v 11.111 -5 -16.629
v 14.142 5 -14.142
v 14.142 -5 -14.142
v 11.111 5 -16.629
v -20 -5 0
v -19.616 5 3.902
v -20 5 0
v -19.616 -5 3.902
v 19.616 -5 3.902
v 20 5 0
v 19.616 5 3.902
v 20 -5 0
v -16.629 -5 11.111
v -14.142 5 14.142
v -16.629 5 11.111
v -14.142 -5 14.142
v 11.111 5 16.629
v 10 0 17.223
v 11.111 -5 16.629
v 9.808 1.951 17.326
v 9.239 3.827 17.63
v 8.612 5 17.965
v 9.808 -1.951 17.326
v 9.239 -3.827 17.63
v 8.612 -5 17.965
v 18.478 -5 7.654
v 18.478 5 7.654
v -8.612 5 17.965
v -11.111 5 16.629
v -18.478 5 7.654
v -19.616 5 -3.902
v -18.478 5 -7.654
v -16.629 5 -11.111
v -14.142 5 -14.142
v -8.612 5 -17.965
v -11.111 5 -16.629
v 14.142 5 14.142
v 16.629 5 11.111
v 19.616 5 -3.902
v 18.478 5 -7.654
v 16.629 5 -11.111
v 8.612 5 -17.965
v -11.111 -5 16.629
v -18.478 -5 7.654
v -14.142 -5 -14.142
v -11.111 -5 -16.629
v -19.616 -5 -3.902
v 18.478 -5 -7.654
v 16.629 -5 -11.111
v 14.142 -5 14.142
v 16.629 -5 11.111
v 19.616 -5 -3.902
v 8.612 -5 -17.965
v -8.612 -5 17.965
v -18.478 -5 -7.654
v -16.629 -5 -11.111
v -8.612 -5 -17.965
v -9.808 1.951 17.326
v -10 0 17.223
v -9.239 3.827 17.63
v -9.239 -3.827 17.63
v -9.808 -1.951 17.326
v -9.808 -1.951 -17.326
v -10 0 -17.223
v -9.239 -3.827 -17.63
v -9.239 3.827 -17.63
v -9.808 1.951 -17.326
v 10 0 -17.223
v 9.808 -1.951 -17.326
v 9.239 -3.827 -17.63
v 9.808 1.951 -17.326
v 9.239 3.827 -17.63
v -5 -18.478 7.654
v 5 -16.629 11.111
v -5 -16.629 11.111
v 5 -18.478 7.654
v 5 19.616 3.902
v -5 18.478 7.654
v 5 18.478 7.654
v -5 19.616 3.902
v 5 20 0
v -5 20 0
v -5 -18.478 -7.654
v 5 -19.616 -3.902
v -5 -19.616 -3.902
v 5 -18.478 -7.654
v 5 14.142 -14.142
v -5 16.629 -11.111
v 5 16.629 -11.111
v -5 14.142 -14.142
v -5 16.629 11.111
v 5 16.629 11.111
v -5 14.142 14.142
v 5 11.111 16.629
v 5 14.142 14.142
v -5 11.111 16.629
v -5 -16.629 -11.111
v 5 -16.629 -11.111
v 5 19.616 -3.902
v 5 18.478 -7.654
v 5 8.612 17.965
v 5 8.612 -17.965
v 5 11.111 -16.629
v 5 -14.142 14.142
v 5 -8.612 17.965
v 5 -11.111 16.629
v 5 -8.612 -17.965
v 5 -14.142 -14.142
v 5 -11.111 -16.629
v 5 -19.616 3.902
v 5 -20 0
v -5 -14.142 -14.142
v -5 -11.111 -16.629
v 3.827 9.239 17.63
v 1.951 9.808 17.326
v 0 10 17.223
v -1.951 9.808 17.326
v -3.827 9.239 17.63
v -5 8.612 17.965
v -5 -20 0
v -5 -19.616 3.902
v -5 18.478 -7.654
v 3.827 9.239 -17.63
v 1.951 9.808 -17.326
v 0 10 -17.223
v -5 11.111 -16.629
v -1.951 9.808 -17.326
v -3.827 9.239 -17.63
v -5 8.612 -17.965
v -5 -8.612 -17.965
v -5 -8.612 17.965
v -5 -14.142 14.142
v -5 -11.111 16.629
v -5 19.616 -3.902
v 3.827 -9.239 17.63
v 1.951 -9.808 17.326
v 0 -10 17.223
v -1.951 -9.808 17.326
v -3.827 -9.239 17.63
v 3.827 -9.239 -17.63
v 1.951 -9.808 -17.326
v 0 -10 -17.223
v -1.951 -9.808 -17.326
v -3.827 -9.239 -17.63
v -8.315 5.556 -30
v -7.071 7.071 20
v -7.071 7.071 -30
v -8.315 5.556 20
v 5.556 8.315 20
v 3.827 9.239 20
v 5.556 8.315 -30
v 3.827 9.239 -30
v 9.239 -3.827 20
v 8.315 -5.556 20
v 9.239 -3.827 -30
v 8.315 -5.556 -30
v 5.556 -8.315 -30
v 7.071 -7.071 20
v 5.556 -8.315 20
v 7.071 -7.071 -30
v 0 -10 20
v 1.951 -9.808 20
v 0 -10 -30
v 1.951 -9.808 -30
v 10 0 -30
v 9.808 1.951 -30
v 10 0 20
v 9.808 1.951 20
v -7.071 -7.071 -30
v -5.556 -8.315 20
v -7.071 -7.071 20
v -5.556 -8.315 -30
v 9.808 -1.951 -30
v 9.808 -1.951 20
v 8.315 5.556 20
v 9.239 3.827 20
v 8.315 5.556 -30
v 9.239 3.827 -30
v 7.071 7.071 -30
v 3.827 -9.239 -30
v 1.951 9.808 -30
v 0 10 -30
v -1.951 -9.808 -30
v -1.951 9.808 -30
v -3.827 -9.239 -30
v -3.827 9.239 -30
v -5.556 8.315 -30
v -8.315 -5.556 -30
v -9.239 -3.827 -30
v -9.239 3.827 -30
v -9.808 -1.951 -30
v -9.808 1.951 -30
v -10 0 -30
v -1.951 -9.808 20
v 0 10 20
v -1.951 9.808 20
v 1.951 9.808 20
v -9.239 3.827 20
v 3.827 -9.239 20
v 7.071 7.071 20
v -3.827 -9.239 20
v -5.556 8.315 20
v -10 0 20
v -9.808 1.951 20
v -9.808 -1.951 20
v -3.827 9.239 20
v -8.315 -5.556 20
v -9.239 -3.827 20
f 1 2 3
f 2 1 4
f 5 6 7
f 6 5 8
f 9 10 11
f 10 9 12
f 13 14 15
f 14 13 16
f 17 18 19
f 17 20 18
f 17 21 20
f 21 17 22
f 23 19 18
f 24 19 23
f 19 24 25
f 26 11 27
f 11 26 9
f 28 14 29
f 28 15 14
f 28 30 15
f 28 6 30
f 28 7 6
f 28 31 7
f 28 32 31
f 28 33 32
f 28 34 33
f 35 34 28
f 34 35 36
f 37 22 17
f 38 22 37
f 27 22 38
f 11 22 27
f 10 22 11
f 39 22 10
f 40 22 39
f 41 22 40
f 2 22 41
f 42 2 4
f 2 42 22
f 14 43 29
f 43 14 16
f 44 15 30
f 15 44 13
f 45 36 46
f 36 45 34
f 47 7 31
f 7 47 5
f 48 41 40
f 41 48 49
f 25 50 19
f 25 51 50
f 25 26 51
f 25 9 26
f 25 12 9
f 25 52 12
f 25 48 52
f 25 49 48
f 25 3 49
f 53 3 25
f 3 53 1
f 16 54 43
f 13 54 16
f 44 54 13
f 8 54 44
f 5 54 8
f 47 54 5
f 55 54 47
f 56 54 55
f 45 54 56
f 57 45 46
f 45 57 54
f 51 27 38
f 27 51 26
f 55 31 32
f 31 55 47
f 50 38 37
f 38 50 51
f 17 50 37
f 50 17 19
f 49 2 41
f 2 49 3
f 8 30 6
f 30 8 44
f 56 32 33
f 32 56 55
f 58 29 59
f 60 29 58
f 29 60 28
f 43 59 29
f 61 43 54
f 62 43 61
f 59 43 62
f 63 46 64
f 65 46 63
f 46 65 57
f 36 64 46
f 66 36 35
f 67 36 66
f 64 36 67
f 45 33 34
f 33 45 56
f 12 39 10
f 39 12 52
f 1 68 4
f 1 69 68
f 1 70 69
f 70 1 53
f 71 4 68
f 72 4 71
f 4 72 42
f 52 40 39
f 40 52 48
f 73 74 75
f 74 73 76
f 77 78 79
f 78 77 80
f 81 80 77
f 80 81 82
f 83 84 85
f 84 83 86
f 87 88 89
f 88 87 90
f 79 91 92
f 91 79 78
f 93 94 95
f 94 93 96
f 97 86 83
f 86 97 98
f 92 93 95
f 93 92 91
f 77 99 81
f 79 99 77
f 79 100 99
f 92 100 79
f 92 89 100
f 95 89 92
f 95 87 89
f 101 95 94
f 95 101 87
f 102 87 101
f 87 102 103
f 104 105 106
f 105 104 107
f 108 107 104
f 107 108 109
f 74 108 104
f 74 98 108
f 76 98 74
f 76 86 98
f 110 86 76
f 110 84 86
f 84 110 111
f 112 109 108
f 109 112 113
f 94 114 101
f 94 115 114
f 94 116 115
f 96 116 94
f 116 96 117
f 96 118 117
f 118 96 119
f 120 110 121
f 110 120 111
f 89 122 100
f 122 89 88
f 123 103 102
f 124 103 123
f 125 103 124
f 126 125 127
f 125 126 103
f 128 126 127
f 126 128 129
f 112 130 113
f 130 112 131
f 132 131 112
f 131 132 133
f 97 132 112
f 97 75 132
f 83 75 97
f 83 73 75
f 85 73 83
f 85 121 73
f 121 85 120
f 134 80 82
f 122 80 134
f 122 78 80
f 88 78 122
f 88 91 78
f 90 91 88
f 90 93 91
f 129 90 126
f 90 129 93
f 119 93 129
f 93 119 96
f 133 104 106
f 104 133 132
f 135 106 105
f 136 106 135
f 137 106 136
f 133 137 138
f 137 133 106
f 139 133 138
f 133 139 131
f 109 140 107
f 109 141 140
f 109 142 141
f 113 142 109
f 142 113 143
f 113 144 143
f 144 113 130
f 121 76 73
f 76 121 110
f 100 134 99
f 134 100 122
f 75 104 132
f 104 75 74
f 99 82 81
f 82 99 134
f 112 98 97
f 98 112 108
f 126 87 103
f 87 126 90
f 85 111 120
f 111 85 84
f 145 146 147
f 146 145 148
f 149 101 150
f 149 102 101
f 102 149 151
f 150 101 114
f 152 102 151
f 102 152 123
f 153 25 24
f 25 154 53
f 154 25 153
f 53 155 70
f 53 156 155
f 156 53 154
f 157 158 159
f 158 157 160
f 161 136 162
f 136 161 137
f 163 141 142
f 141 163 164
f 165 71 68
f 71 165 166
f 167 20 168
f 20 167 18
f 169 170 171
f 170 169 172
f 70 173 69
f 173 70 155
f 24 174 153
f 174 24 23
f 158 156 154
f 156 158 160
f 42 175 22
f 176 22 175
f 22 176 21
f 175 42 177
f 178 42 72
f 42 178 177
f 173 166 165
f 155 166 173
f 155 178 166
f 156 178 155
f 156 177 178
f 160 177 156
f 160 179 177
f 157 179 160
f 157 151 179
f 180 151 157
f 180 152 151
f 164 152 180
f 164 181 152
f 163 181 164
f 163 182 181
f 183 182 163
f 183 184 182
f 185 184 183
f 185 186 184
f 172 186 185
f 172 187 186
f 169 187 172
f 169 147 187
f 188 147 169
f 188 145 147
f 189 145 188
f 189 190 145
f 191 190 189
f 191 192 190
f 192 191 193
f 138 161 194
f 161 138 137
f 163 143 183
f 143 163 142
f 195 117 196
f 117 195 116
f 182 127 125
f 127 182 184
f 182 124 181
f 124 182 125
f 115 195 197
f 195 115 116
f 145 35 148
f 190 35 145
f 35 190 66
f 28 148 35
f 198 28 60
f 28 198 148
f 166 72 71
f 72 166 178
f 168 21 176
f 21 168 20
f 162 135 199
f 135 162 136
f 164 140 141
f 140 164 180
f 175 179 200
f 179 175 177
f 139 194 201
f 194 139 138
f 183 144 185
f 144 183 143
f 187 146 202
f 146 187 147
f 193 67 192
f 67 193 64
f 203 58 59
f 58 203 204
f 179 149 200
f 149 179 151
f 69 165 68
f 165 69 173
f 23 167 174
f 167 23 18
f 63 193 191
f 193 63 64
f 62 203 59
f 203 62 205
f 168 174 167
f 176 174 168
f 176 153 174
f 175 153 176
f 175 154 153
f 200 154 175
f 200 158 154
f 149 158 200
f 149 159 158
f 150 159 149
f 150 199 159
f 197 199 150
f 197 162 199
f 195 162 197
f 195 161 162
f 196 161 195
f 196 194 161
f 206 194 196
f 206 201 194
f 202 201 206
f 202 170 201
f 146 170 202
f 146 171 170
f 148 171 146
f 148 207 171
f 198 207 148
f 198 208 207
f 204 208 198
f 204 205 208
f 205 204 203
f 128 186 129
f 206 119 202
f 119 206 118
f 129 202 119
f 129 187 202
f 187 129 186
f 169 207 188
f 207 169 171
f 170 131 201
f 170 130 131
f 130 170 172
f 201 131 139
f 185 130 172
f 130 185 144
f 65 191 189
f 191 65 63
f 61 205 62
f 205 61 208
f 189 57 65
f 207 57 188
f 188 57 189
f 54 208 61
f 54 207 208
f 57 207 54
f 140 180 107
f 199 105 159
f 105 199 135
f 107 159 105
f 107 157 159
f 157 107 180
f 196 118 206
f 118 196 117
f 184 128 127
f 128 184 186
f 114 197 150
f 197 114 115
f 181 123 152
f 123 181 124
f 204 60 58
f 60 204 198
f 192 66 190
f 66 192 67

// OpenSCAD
$fn = 32;

module spaceship() {
    // Main body
    hull() {
        cylinder(h = 40, r1 = 5, r2 = 10, center = true);
        translate([0, 0, -20]) cylinder(h = 20, r1 = 10, r2 = 5, center = true);
    }
    
    // Wings
    translate([0, 0, 0]) {
        rotate([90, 0, 0]) cylinder(h = 10, r = 20, center = true);
        rotate([90, 0, 90]) cylinder(h = 10, r = 20, center = true);
    }
    
    // Cockpit
    translate([10, 0, 5]) 
    sphere(r = 4);
}

spaceship();
